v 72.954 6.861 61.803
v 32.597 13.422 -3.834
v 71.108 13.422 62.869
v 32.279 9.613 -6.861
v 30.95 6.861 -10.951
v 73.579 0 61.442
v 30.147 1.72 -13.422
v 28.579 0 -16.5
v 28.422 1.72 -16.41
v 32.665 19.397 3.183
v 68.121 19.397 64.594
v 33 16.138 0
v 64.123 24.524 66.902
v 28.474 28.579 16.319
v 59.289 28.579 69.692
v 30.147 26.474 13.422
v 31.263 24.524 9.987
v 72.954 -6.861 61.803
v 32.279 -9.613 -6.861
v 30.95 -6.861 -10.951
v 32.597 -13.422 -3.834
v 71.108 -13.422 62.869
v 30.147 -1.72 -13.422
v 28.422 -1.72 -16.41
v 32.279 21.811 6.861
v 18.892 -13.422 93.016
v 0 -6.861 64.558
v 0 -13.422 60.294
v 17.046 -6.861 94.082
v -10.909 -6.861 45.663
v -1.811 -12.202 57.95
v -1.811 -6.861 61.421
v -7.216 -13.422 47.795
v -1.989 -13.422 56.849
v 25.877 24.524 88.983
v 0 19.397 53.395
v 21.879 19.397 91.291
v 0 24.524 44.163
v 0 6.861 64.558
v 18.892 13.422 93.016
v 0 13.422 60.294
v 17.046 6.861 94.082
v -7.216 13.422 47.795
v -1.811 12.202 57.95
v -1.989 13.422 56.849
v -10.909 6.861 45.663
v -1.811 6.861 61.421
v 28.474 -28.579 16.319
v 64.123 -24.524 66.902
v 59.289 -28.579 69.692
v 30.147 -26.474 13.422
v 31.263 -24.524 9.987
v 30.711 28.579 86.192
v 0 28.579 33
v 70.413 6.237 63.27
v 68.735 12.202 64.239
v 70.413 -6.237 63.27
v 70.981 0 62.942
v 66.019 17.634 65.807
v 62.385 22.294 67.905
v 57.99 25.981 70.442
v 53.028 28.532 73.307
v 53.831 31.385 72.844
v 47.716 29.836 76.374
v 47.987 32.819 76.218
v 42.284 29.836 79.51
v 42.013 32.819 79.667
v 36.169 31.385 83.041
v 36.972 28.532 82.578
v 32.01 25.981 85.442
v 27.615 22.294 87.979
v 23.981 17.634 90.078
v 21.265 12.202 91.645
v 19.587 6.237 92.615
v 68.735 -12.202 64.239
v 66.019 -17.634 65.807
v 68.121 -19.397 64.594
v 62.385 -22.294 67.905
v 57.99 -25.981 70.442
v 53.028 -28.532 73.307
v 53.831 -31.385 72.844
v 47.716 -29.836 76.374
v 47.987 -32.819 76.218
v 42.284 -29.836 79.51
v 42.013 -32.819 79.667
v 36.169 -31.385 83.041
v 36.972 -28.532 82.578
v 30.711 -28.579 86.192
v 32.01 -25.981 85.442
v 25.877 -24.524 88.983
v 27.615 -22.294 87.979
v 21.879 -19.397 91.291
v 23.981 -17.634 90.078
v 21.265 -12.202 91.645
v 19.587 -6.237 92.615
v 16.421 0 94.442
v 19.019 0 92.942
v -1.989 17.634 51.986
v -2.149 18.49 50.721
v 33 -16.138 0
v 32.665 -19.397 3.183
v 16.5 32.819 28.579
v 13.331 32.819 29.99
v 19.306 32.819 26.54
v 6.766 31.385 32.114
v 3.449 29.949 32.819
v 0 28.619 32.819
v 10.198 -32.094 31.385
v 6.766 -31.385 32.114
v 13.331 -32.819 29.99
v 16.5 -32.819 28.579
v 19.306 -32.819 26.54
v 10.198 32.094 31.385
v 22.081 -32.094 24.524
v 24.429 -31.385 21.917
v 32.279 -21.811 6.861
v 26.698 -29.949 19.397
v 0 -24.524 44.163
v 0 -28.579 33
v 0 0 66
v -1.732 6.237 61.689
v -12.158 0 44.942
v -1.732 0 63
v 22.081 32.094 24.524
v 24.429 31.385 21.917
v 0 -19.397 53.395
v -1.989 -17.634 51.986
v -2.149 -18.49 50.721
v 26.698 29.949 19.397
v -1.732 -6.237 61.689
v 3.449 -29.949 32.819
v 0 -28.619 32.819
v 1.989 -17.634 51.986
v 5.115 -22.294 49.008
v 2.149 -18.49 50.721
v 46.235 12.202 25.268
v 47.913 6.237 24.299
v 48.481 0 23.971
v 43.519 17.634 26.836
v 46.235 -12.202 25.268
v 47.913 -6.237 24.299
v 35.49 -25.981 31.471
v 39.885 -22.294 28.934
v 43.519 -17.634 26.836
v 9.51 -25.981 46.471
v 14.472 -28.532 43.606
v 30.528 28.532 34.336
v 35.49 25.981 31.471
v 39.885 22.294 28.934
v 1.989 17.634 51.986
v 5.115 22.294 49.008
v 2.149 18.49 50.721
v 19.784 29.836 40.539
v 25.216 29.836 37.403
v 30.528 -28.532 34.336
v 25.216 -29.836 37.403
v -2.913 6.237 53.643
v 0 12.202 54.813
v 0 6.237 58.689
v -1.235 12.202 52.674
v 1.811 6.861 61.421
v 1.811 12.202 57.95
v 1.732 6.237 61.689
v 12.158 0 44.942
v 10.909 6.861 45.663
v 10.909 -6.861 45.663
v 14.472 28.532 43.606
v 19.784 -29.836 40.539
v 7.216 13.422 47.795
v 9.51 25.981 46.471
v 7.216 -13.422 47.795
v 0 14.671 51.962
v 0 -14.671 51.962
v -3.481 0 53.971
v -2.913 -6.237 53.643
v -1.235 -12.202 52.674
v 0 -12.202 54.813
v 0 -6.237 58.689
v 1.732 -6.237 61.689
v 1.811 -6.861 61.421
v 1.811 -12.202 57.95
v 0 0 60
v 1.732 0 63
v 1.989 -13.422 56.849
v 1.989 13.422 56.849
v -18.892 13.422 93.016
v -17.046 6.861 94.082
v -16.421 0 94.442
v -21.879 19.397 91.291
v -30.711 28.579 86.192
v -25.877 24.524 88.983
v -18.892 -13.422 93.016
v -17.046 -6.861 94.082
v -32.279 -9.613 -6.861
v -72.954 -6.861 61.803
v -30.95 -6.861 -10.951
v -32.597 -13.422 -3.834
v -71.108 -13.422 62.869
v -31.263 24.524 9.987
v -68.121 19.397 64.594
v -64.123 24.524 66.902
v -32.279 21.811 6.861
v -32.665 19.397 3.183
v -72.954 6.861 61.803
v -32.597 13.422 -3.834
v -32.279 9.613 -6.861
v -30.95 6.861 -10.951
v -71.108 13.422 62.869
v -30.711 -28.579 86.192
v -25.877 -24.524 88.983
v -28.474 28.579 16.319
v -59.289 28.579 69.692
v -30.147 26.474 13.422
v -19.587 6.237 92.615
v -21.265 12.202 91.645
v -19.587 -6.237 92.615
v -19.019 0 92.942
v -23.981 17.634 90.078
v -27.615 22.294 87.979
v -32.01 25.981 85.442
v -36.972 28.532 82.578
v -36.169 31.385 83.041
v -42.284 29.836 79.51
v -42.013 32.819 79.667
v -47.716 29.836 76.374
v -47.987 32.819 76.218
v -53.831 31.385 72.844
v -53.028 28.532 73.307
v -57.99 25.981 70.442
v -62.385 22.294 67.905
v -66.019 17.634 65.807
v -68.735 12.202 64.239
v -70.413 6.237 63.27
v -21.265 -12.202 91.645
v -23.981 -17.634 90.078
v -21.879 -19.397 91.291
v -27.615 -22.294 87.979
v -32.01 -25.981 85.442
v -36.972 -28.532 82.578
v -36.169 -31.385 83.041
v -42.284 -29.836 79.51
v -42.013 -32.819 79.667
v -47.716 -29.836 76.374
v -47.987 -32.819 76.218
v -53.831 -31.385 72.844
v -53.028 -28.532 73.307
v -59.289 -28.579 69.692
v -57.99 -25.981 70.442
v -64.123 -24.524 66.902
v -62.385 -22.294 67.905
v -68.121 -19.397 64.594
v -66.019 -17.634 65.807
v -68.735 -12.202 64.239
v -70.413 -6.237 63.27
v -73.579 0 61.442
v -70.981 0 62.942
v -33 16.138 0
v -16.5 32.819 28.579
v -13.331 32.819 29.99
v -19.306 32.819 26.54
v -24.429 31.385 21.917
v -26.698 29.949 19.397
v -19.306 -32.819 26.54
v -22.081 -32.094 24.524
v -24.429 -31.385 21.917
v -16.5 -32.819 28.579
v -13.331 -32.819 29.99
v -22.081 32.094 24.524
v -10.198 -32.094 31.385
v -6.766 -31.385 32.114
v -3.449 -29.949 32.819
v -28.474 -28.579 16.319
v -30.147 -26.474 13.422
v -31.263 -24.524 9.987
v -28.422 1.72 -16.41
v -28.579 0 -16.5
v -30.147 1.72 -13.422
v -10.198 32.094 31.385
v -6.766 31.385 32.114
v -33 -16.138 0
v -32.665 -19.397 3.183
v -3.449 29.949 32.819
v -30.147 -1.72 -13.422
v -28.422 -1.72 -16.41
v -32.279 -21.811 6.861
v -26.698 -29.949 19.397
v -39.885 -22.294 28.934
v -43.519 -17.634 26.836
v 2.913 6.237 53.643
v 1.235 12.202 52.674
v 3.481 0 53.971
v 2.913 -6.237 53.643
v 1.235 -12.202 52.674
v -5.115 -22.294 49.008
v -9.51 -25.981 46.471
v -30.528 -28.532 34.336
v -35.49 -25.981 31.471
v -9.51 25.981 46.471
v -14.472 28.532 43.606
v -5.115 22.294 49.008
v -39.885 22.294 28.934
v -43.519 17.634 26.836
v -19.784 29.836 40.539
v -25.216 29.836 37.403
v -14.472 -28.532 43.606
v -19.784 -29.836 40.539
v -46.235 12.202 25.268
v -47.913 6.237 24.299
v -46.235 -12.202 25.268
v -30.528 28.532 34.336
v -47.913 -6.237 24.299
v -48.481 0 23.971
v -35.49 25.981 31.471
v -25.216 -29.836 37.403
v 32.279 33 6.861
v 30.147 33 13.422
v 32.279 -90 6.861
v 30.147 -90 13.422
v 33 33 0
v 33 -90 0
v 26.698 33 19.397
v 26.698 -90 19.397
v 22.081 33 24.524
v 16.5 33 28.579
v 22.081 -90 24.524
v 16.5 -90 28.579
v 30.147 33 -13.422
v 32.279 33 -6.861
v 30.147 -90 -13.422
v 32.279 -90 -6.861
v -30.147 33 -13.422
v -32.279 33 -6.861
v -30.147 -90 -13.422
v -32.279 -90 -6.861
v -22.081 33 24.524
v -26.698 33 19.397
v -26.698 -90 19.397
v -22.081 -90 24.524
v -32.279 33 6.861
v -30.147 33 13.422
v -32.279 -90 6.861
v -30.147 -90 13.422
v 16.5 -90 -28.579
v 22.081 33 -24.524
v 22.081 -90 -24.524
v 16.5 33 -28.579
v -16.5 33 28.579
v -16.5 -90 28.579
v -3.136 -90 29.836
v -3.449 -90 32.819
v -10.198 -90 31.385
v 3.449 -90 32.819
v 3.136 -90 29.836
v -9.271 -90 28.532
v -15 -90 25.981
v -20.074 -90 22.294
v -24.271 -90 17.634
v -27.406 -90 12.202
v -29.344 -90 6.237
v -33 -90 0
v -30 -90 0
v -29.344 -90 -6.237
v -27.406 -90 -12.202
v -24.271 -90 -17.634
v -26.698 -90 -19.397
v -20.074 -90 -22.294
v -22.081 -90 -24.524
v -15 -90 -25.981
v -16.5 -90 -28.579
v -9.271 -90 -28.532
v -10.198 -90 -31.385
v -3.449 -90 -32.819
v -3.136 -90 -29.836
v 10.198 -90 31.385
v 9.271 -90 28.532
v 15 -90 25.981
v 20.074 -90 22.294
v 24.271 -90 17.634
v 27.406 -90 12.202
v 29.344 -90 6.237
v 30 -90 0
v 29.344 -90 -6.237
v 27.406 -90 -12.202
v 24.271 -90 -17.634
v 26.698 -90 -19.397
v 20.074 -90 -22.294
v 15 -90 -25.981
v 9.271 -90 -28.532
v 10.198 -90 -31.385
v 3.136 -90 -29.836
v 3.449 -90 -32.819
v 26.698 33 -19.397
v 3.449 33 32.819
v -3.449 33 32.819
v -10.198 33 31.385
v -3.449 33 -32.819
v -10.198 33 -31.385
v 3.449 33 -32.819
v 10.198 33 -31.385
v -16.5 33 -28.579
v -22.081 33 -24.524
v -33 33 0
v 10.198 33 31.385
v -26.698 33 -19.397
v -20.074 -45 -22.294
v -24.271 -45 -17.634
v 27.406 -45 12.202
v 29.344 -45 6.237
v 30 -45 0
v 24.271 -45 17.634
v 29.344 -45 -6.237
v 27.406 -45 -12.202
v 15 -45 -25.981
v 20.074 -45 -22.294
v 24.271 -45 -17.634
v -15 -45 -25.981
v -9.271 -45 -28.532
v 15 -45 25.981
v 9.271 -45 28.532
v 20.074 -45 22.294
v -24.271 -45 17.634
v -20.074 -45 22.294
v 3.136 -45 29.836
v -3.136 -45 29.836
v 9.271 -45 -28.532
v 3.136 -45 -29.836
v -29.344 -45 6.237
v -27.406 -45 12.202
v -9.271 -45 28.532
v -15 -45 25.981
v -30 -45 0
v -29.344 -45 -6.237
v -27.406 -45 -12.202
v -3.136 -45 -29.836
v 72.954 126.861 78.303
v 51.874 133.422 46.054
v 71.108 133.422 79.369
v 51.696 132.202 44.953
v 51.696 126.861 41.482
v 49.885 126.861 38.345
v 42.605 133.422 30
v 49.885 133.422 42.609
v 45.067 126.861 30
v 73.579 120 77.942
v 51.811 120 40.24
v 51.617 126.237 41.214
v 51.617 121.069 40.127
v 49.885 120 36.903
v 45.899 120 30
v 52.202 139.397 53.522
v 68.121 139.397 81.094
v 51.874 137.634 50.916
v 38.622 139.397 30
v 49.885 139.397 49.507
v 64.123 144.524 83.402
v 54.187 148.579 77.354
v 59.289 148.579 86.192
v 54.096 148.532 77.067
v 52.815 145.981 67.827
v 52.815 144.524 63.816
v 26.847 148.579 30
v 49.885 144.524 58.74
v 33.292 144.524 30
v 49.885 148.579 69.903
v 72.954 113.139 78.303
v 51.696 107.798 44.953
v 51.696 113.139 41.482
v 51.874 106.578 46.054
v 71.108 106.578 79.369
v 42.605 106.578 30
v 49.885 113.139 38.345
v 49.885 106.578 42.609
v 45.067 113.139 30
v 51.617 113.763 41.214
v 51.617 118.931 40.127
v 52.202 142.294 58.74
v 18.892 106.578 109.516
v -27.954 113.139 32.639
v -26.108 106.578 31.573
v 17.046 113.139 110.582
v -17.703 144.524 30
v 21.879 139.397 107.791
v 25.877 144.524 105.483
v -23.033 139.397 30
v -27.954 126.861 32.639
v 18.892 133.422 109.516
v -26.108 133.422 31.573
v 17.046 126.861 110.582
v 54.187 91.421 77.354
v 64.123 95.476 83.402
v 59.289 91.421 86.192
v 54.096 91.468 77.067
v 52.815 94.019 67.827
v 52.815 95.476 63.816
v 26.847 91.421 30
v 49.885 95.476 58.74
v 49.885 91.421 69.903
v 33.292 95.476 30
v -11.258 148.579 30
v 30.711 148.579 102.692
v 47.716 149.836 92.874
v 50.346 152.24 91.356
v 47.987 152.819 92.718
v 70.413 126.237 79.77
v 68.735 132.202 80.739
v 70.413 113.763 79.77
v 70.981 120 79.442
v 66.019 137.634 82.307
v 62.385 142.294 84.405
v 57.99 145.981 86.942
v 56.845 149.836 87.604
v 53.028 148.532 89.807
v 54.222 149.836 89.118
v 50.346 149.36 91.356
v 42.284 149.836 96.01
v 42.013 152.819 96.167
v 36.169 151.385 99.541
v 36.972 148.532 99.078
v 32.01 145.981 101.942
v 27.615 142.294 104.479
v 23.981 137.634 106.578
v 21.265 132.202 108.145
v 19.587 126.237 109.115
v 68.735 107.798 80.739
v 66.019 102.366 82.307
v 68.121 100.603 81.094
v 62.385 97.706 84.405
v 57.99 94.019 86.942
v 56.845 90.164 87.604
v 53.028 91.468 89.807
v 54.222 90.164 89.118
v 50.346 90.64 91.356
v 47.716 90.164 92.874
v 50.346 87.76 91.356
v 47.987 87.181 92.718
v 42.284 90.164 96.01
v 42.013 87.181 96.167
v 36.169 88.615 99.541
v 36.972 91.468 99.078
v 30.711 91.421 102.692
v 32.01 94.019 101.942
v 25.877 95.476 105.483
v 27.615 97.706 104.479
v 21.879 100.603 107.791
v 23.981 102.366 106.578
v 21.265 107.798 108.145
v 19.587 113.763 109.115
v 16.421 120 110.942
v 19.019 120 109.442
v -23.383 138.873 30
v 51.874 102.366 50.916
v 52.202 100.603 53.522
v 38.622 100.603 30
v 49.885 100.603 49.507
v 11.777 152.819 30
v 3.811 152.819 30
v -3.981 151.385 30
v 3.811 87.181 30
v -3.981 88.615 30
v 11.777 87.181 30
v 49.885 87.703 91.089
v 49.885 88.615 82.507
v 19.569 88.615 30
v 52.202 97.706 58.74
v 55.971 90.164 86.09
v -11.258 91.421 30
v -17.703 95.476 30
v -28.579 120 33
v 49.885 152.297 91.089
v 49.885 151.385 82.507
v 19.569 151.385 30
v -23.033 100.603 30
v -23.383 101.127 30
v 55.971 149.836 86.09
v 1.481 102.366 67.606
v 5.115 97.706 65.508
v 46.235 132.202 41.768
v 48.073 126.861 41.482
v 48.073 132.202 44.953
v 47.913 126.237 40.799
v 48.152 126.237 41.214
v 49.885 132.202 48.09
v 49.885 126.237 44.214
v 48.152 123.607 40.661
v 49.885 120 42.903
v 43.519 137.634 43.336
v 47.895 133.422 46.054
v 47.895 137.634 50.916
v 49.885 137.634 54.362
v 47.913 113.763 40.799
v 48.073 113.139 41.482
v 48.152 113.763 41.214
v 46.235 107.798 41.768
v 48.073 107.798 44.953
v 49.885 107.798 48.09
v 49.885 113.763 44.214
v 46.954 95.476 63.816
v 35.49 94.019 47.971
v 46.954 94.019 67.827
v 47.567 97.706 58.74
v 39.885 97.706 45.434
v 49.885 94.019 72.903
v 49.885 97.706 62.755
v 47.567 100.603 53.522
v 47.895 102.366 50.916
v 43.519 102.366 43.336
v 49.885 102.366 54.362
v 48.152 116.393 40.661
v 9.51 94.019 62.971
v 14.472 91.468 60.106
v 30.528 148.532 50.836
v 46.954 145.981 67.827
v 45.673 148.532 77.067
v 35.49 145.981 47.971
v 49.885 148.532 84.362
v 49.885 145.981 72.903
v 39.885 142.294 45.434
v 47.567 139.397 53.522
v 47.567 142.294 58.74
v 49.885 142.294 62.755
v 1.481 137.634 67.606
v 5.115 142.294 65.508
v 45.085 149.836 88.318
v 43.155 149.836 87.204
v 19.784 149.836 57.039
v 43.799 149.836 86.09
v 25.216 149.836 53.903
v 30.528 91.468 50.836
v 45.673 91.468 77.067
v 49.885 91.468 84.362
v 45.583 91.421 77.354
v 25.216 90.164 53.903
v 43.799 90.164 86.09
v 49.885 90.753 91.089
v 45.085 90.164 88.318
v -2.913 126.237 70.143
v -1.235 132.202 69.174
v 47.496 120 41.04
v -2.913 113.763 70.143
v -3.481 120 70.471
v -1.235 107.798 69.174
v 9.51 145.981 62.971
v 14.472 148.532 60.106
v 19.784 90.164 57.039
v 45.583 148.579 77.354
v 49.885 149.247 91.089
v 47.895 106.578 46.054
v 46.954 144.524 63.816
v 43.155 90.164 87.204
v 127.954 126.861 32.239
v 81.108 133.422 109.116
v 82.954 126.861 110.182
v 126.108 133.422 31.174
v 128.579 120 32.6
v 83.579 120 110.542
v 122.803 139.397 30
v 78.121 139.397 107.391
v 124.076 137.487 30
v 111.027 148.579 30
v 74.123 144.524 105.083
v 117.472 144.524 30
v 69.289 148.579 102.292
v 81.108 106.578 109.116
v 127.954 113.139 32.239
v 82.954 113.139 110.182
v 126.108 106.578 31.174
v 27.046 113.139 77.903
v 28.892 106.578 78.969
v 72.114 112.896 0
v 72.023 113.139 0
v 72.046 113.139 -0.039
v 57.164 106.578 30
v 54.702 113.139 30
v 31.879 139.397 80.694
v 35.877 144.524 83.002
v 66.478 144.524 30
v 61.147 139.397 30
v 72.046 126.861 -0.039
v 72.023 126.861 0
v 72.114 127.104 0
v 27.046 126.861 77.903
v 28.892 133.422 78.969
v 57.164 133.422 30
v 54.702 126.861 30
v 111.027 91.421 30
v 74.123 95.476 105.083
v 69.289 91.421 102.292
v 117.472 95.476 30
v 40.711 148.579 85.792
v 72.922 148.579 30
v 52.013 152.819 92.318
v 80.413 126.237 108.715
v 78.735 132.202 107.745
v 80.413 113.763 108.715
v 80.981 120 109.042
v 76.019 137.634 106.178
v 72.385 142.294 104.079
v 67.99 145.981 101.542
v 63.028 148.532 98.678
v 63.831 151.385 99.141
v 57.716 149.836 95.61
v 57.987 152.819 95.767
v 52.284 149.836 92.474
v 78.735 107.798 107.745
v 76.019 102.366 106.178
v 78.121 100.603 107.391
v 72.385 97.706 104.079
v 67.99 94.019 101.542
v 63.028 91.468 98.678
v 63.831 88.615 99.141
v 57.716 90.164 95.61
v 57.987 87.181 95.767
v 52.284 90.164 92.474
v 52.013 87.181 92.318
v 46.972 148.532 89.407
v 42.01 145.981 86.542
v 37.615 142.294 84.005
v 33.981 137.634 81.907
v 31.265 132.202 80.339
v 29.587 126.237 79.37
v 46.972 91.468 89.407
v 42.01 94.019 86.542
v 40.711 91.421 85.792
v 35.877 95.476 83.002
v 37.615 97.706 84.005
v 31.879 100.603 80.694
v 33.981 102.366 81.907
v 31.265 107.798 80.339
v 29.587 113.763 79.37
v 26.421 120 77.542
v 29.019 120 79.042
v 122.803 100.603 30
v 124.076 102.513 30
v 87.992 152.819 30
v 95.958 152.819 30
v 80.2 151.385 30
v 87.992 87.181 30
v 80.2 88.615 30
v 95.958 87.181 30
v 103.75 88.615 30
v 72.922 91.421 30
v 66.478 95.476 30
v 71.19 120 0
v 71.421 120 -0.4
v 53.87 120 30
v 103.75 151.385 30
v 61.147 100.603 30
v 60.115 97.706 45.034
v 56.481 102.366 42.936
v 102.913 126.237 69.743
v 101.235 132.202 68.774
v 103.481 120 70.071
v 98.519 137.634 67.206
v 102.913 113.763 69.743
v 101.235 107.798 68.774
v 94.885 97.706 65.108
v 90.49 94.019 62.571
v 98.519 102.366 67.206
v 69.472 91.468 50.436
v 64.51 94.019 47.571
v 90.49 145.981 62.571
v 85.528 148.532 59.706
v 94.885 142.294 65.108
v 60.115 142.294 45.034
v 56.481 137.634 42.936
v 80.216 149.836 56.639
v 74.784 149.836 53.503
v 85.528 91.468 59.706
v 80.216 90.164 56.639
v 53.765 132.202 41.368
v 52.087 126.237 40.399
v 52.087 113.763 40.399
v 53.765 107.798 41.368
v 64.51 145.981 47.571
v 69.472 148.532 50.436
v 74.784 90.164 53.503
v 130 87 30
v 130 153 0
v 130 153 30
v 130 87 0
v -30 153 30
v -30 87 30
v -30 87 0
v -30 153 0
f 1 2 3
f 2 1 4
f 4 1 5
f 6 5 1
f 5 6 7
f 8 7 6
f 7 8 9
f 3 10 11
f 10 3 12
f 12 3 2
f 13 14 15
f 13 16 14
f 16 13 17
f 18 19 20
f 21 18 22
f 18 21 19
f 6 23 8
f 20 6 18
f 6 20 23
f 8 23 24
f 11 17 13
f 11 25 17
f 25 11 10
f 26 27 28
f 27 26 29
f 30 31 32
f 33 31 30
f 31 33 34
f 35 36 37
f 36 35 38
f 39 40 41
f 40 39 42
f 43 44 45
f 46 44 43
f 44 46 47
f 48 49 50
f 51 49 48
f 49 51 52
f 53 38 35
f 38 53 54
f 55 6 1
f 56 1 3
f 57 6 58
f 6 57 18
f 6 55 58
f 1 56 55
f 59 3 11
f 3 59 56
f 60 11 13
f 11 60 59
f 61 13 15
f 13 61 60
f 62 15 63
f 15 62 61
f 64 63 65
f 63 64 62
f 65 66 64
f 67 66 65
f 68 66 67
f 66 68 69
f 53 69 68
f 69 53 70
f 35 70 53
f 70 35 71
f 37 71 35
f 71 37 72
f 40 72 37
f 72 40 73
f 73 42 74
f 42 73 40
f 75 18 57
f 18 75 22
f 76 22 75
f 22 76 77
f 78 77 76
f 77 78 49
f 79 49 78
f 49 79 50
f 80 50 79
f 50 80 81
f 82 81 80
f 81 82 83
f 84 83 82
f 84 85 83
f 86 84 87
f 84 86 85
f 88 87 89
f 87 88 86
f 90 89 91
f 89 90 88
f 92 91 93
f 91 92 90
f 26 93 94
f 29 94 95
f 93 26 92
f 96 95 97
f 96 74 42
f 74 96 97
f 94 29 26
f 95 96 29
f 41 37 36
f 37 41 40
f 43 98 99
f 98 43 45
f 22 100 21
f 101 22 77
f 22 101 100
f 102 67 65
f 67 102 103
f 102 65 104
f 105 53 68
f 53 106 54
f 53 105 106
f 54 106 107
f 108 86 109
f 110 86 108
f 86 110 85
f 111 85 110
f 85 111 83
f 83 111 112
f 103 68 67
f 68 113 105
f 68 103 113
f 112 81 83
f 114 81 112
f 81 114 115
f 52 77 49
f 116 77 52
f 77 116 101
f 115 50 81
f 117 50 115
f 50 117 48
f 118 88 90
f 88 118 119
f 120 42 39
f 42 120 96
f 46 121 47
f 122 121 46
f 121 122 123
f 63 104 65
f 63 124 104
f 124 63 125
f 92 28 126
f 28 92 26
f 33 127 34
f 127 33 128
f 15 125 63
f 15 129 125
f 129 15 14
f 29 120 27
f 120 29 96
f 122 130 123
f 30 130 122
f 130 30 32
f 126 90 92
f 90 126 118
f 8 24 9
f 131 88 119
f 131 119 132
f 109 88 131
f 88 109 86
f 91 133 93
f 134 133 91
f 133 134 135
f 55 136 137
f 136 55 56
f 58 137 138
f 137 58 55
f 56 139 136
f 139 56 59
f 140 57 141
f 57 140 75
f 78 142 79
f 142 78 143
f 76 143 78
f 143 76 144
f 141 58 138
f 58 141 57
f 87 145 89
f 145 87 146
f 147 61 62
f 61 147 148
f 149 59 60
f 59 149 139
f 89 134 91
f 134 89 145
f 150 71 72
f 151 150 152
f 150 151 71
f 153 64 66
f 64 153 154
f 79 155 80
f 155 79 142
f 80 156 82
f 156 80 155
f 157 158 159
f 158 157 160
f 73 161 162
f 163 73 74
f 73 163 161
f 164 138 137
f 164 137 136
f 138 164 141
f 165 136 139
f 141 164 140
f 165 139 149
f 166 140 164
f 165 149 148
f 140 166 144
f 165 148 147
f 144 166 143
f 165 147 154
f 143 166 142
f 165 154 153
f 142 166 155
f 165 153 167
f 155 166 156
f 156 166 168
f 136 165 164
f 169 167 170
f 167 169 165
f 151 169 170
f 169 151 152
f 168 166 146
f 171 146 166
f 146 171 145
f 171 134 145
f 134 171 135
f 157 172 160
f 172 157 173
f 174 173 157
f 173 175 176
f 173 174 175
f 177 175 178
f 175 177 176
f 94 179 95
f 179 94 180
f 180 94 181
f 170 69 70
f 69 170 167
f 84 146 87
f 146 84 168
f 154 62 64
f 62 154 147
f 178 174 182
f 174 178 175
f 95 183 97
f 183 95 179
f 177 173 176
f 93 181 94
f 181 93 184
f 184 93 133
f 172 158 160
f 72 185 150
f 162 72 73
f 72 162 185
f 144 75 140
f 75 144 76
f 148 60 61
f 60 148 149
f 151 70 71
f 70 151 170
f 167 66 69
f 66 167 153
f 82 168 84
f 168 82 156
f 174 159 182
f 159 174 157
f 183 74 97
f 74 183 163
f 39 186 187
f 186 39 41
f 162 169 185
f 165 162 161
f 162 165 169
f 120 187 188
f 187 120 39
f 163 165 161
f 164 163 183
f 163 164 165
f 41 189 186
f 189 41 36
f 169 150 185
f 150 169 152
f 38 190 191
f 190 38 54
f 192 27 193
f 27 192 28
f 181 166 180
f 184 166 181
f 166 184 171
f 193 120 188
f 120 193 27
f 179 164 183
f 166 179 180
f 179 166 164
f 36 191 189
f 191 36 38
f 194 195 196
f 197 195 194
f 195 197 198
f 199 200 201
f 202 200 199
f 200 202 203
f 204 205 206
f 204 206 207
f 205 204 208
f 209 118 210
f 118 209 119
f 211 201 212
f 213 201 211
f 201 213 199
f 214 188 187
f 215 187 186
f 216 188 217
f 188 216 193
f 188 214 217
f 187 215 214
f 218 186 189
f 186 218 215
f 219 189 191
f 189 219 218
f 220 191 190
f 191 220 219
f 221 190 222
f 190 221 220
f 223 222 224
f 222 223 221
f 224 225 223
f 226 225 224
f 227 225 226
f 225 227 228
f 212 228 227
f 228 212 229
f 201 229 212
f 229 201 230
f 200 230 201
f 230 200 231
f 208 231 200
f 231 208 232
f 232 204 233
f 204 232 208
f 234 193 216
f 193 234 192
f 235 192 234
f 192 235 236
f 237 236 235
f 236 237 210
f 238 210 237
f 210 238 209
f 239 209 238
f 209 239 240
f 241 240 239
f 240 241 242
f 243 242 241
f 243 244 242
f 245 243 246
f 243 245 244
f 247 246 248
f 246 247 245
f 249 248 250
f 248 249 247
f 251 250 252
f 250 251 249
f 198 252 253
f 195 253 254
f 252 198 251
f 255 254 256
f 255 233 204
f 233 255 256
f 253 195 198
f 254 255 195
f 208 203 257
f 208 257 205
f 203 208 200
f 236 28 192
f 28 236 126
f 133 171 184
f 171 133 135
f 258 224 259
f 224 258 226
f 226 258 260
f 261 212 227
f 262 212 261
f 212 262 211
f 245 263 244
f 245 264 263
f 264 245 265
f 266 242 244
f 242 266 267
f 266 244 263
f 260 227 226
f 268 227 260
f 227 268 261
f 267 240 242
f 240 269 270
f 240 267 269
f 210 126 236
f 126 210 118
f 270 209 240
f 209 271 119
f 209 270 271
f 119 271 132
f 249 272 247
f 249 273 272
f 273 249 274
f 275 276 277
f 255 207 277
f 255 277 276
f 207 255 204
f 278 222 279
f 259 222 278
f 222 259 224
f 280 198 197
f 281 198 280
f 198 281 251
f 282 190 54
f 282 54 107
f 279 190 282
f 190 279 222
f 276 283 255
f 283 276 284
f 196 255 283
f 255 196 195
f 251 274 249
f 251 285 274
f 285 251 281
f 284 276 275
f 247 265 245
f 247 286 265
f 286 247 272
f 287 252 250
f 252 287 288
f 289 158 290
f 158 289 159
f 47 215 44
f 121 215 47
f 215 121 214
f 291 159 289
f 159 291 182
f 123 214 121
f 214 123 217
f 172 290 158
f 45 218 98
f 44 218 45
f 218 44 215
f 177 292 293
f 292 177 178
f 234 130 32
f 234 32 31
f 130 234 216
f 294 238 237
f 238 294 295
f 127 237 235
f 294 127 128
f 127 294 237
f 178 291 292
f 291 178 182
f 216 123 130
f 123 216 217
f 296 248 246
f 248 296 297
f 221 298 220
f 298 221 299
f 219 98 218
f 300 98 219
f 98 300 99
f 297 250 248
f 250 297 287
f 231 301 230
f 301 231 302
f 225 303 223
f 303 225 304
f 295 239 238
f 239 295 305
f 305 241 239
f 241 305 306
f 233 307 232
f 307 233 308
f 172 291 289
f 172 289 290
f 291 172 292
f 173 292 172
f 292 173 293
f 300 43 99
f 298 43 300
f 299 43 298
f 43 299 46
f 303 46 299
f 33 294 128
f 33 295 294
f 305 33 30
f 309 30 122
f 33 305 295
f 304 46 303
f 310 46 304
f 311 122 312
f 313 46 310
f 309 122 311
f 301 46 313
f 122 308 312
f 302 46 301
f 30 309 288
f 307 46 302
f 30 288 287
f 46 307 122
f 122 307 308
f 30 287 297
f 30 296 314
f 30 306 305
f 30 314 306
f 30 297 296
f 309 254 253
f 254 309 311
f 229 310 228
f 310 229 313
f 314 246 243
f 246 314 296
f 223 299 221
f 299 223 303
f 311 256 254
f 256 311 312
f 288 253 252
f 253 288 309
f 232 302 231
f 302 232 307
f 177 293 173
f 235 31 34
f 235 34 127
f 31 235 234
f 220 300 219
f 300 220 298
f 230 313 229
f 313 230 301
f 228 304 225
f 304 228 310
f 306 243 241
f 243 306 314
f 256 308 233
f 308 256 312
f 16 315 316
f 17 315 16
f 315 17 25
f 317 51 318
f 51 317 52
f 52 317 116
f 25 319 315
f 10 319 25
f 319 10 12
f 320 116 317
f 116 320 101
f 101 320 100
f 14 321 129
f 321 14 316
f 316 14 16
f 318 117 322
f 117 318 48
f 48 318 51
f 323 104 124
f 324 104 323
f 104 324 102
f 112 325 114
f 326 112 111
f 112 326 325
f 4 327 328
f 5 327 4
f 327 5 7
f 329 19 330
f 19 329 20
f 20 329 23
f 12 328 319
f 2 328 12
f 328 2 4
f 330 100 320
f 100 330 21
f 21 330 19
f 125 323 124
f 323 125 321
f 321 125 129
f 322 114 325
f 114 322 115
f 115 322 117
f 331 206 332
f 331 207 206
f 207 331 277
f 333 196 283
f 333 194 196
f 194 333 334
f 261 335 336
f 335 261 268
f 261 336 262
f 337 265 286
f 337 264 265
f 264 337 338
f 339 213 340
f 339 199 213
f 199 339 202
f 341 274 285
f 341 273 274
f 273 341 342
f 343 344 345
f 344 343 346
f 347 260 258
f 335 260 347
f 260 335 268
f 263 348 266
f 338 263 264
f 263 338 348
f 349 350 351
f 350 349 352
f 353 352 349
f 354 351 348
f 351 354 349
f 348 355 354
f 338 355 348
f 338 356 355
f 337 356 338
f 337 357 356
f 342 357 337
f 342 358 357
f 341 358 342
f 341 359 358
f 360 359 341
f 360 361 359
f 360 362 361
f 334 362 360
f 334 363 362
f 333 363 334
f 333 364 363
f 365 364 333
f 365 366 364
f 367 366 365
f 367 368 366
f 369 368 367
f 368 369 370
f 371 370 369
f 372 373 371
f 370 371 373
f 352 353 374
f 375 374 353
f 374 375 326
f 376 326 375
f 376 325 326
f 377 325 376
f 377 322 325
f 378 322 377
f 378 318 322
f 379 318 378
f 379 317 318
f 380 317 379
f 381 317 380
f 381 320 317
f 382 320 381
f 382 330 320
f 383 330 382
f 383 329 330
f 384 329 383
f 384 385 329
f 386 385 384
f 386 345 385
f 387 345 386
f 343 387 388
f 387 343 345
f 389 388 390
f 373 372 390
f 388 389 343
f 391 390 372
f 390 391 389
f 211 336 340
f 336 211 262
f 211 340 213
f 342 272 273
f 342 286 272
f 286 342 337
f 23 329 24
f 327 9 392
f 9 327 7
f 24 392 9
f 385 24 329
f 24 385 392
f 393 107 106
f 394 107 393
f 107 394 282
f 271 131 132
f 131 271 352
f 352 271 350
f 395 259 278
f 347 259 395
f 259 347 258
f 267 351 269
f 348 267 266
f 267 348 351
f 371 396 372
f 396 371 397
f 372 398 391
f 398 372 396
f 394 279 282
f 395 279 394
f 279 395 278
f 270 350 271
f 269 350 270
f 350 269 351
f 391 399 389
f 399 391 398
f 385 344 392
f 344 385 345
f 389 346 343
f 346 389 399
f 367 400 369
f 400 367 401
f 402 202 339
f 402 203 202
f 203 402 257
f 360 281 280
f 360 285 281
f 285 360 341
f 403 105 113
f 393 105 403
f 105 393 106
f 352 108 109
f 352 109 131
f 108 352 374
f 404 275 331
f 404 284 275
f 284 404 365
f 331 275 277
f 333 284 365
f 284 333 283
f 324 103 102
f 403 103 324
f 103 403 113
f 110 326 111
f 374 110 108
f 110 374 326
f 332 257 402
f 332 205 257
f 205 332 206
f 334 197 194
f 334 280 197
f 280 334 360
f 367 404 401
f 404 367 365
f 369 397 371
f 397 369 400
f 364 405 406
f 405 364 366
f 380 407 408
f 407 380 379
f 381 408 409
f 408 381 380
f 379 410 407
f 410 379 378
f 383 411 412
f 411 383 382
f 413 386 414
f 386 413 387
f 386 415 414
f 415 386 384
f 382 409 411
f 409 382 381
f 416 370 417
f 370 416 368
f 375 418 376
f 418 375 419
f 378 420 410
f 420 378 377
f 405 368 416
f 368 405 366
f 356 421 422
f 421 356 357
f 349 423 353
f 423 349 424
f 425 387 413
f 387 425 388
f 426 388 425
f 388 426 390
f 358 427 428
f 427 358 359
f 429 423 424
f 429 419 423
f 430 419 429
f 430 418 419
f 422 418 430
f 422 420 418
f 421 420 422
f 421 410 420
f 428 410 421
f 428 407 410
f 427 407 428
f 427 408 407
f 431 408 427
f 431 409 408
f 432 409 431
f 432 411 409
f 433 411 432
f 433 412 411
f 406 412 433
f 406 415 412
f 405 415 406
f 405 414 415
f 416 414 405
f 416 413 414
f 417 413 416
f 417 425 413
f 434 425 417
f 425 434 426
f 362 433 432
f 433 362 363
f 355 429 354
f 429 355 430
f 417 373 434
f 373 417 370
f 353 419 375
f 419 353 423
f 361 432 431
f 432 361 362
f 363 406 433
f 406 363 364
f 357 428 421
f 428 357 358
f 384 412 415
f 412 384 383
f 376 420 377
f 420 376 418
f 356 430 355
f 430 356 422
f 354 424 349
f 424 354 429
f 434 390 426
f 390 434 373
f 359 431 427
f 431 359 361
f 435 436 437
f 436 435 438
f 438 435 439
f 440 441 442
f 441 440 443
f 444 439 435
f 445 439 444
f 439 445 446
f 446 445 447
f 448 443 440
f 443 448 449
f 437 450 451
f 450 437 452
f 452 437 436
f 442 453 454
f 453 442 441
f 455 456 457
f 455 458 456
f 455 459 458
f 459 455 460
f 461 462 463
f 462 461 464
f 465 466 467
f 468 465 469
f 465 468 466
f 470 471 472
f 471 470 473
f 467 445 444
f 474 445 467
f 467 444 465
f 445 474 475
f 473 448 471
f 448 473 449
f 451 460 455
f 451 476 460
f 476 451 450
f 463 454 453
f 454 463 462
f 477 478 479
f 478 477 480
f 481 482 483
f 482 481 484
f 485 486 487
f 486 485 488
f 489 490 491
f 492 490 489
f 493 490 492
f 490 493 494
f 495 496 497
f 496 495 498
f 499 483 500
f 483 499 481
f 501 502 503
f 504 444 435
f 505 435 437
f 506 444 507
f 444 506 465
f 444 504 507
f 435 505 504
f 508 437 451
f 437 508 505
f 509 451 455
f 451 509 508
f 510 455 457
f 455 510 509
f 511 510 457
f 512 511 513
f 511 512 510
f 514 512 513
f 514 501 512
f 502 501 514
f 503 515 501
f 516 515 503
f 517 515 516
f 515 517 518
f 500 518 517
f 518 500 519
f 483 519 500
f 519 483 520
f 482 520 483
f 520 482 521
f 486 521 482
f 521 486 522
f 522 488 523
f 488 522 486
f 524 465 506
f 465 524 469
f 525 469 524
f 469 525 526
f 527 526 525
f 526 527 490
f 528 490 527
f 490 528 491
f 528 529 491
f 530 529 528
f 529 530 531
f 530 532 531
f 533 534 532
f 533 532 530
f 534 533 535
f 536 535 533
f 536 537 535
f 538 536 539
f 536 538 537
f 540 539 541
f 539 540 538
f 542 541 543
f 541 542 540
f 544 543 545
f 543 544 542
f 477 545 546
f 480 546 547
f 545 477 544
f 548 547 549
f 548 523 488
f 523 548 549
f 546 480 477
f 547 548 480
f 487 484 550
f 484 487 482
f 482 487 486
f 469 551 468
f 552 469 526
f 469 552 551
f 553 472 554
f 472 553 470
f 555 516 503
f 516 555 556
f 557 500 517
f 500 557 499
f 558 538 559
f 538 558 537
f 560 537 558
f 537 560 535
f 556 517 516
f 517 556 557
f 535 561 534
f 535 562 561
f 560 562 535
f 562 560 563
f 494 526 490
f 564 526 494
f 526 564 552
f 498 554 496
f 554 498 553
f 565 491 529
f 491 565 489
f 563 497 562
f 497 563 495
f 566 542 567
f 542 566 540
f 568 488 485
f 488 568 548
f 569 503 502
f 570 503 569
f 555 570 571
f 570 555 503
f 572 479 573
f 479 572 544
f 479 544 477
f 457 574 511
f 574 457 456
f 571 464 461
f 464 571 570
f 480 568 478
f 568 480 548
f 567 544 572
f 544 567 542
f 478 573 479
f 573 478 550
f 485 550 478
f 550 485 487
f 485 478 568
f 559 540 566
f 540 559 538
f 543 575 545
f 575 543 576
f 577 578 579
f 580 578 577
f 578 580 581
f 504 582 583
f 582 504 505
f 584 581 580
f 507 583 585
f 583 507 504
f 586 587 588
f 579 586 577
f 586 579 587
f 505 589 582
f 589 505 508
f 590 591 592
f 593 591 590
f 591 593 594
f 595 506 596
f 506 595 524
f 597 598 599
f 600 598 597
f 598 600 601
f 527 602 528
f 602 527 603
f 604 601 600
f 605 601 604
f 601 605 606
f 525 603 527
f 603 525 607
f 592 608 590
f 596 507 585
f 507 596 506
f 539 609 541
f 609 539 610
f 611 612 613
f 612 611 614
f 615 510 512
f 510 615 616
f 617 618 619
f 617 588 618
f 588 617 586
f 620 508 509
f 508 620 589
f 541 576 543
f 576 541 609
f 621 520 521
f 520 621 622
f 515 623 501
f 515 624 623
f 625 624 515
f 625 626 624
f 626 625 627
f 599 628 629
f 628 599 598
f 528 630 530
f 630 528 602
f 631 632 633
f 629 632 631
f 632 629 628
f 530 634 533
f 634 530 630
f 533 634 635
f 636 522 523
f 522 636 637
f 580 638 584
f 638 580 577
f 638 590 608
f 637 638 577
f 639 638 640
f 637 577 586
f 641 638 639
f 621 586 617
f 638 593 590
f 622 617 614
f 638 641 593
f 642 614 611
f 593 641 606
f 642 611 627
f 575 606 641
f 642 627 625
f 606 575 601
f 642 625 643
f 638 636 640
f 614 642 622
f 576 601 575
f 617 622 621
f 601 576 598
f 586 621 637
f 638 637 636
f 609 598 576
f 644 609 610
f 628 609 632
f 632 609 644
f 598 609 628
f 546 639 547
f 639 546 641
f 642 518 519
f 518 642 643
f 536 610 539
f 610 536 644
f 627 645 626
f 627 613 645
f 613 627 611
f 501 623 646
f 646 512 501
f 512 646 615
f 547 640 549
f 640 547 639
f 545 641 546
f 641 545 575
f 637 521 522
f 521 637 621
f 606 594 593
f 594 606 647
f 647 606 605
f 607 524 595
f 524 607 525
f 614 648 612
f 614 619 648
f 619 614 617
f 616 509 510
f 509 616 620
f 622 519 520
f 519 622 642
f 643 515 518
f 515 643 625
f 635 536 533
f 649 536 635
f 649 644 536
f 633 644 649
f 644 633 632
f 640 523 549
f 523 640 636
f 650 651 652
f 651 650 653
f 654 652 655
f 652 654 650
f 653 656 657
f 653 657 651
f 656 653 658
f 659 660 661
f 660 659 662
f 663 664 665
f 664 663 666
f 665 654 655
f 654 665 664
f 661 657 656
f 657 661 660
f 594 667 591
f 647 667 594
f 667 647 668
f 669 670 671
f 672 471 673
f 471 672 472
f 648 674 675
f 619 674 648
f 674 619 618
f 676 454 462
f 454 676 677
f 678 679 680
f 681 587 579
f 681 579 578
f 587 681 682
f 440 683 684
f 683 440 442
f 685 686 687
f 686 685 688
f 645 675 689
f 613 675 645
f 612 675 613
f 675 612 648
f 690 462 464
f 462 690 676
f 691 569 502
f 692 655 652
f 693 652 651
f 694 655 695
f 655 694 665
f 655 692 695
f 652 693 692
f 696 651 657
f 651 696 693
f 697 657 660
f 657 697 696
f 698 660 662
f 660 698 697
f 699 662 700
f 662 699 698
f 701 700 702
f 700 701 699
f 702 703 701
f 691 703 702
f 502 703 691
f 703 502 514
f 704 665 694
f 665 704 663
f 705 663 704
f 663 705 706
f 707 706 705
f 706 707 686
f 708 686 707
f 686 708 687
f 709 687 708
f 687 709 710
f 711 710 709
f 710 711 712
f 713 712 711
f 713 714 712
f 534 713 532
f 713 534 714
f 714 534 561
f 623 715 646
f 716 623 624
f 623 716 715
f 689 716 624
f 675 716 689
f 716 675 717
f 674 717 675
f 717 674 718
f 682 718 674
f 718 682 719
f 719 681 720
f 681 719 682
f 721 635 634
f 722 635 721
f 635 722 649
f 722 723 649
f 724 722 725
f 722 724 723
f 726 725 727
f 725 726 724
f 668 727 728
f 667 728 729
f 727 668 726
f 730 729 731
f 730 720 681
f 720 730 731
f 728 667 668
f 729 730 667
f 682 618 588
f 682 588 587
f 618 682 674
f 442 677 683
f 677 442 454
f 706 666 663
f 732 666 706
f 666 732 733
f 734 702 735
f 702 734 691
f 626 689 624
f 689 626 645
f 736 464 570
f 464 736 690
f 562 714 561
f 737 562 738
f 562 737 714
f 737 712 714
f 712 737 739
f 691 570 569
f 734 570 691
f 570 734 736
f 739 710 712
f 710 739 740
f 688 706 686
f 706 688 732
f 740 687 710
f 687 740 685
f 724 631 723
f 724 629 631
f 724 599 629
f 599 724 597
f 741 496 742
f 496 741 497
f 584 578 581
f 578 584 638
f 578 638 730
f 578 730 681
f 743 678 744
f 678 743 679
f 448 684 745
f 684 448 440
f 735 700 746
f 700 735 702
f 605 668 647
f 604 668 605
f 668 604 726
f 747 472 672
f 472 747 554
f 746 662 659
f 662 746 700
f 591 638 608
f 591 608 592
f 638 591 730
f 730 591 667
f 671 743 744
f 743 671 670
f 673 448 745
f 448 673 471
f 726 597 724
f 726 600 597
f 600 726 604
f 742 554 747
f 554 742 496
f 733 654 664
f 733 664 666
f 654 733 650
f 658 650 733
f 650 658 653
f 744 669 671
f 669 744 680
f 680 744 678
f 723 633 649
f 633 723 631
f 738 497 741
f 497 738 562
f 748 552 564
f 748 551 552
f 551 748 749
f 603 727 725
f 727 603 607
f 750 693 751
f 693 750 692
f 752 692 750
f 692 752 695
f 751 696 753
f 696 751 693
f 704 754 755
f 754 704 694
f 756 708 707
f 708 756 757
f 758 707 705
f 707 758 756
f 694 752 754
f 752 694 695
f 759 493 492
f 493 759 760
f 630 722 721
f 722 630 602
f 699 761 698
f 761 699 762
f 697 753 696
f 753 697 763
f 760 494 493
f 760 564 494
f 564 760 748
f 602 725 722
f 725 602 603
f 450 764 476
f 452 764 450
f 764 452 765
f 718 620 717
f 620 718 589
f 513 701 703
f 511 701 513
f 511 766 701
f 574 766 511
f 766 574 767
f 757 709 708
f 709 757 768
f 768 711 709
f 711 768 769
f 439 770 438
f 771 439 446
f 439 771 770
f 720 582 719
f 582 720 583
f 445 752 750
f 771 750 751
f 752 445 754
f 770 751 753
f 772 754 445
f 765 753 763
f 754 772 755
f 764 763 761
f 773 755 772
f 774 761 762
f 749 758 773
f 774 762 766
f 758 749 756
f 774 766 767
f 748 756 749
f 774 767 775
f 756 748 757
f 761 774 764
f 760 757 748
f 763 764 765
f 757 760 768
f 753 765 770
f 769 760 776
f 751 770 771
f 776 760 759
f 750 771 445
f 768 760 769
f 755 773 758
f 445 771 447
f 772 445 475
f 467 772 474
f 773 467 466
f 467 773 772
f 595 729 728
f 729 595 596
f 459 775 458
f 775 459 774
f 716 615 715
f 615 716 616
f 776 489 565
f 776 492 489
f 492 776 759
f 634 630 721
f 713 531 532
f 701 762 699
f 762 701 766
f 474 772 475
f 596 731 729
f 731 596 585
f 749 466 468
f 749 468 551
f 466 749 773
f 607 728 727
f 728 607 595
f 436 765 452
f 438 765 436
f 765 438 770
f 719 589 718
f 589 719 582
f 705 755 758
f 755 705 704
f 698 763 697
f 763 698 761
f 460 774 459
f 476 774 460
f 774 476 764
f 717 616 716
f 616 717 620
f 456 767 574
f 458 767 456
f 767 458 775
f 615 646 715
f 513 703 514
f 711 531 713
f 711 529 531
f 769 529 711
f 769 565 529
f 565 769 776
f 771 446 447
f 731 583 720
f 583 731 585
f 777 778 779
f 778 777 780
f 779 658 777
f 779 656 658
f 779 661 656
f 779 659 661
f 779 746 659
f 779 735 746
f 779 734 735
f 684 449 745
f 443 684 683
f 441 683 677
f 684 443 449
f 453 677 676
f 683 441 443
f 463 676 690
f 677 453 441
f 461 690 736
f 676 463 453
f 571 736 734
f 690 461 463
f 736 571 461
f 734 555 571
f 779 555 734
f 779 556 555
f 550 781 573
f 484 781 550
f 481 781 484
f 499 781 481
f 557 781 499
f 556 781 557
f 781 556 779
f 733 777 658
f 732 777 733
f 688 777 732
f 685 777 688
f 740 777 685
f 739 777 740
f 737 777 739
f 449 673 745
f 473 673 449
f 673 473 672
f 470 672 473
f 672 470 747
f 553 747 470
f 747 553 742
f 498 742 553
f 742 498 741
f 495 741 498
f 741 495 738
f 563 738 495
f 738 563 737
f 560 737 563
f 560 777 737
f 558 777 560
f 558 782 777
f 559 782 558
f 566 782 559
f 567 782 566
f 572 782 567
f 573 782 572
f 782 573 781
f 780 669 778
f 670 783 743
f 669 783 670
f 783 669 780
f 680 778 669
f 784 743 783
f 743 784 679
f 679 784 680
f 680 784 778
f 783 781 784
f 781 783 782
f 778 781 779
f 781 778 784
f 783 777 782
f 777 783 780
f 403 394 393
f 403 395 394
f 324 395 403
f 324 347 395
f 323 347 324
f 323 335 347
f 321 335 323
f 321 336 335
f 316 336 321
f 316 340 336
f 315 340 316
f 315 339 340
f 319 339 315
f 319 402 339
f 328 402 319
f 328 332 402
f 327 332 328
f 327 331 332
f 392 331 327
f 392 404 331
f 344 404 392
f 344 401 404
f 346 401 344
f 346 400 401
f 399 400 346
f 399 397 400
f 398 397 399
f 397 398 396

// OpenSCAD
$fn=30;
piperadius=30;
wall=3;
length=100;

// connector
rotate([0,30,0]) tube();
rotate([0,-30,0]) tube();
rotate([90,0,0]) tube();

rotate([90,0,0])
cylinder(center=true, r= piperadius+ wall, h=2 * (piperadius + wall));


//bracket
translate([0, 4* piperadius,0]){
   translate([0, 0, (sin(30) * (piperadius + wall))]) rotate([0,30,0]) tube();
    translate([-(piperadius), -(piperadius + wall), 0]) 
         cube([length + piperadius*2, (piperadius + wall) * 2, piperadius]);
    translate([length, 0,(sin(30) * (piperadius + wall)) -0.4]) rotate([0,-30,0]) tube();
}
module tube(){
difference(){
cylinder(r= piperadius+ wall, h=3 * piperadius);
translate([0, 0, 1.5 * piperadius]) cylinder(r=piperadius, h=2 * piperadius);
}

}
